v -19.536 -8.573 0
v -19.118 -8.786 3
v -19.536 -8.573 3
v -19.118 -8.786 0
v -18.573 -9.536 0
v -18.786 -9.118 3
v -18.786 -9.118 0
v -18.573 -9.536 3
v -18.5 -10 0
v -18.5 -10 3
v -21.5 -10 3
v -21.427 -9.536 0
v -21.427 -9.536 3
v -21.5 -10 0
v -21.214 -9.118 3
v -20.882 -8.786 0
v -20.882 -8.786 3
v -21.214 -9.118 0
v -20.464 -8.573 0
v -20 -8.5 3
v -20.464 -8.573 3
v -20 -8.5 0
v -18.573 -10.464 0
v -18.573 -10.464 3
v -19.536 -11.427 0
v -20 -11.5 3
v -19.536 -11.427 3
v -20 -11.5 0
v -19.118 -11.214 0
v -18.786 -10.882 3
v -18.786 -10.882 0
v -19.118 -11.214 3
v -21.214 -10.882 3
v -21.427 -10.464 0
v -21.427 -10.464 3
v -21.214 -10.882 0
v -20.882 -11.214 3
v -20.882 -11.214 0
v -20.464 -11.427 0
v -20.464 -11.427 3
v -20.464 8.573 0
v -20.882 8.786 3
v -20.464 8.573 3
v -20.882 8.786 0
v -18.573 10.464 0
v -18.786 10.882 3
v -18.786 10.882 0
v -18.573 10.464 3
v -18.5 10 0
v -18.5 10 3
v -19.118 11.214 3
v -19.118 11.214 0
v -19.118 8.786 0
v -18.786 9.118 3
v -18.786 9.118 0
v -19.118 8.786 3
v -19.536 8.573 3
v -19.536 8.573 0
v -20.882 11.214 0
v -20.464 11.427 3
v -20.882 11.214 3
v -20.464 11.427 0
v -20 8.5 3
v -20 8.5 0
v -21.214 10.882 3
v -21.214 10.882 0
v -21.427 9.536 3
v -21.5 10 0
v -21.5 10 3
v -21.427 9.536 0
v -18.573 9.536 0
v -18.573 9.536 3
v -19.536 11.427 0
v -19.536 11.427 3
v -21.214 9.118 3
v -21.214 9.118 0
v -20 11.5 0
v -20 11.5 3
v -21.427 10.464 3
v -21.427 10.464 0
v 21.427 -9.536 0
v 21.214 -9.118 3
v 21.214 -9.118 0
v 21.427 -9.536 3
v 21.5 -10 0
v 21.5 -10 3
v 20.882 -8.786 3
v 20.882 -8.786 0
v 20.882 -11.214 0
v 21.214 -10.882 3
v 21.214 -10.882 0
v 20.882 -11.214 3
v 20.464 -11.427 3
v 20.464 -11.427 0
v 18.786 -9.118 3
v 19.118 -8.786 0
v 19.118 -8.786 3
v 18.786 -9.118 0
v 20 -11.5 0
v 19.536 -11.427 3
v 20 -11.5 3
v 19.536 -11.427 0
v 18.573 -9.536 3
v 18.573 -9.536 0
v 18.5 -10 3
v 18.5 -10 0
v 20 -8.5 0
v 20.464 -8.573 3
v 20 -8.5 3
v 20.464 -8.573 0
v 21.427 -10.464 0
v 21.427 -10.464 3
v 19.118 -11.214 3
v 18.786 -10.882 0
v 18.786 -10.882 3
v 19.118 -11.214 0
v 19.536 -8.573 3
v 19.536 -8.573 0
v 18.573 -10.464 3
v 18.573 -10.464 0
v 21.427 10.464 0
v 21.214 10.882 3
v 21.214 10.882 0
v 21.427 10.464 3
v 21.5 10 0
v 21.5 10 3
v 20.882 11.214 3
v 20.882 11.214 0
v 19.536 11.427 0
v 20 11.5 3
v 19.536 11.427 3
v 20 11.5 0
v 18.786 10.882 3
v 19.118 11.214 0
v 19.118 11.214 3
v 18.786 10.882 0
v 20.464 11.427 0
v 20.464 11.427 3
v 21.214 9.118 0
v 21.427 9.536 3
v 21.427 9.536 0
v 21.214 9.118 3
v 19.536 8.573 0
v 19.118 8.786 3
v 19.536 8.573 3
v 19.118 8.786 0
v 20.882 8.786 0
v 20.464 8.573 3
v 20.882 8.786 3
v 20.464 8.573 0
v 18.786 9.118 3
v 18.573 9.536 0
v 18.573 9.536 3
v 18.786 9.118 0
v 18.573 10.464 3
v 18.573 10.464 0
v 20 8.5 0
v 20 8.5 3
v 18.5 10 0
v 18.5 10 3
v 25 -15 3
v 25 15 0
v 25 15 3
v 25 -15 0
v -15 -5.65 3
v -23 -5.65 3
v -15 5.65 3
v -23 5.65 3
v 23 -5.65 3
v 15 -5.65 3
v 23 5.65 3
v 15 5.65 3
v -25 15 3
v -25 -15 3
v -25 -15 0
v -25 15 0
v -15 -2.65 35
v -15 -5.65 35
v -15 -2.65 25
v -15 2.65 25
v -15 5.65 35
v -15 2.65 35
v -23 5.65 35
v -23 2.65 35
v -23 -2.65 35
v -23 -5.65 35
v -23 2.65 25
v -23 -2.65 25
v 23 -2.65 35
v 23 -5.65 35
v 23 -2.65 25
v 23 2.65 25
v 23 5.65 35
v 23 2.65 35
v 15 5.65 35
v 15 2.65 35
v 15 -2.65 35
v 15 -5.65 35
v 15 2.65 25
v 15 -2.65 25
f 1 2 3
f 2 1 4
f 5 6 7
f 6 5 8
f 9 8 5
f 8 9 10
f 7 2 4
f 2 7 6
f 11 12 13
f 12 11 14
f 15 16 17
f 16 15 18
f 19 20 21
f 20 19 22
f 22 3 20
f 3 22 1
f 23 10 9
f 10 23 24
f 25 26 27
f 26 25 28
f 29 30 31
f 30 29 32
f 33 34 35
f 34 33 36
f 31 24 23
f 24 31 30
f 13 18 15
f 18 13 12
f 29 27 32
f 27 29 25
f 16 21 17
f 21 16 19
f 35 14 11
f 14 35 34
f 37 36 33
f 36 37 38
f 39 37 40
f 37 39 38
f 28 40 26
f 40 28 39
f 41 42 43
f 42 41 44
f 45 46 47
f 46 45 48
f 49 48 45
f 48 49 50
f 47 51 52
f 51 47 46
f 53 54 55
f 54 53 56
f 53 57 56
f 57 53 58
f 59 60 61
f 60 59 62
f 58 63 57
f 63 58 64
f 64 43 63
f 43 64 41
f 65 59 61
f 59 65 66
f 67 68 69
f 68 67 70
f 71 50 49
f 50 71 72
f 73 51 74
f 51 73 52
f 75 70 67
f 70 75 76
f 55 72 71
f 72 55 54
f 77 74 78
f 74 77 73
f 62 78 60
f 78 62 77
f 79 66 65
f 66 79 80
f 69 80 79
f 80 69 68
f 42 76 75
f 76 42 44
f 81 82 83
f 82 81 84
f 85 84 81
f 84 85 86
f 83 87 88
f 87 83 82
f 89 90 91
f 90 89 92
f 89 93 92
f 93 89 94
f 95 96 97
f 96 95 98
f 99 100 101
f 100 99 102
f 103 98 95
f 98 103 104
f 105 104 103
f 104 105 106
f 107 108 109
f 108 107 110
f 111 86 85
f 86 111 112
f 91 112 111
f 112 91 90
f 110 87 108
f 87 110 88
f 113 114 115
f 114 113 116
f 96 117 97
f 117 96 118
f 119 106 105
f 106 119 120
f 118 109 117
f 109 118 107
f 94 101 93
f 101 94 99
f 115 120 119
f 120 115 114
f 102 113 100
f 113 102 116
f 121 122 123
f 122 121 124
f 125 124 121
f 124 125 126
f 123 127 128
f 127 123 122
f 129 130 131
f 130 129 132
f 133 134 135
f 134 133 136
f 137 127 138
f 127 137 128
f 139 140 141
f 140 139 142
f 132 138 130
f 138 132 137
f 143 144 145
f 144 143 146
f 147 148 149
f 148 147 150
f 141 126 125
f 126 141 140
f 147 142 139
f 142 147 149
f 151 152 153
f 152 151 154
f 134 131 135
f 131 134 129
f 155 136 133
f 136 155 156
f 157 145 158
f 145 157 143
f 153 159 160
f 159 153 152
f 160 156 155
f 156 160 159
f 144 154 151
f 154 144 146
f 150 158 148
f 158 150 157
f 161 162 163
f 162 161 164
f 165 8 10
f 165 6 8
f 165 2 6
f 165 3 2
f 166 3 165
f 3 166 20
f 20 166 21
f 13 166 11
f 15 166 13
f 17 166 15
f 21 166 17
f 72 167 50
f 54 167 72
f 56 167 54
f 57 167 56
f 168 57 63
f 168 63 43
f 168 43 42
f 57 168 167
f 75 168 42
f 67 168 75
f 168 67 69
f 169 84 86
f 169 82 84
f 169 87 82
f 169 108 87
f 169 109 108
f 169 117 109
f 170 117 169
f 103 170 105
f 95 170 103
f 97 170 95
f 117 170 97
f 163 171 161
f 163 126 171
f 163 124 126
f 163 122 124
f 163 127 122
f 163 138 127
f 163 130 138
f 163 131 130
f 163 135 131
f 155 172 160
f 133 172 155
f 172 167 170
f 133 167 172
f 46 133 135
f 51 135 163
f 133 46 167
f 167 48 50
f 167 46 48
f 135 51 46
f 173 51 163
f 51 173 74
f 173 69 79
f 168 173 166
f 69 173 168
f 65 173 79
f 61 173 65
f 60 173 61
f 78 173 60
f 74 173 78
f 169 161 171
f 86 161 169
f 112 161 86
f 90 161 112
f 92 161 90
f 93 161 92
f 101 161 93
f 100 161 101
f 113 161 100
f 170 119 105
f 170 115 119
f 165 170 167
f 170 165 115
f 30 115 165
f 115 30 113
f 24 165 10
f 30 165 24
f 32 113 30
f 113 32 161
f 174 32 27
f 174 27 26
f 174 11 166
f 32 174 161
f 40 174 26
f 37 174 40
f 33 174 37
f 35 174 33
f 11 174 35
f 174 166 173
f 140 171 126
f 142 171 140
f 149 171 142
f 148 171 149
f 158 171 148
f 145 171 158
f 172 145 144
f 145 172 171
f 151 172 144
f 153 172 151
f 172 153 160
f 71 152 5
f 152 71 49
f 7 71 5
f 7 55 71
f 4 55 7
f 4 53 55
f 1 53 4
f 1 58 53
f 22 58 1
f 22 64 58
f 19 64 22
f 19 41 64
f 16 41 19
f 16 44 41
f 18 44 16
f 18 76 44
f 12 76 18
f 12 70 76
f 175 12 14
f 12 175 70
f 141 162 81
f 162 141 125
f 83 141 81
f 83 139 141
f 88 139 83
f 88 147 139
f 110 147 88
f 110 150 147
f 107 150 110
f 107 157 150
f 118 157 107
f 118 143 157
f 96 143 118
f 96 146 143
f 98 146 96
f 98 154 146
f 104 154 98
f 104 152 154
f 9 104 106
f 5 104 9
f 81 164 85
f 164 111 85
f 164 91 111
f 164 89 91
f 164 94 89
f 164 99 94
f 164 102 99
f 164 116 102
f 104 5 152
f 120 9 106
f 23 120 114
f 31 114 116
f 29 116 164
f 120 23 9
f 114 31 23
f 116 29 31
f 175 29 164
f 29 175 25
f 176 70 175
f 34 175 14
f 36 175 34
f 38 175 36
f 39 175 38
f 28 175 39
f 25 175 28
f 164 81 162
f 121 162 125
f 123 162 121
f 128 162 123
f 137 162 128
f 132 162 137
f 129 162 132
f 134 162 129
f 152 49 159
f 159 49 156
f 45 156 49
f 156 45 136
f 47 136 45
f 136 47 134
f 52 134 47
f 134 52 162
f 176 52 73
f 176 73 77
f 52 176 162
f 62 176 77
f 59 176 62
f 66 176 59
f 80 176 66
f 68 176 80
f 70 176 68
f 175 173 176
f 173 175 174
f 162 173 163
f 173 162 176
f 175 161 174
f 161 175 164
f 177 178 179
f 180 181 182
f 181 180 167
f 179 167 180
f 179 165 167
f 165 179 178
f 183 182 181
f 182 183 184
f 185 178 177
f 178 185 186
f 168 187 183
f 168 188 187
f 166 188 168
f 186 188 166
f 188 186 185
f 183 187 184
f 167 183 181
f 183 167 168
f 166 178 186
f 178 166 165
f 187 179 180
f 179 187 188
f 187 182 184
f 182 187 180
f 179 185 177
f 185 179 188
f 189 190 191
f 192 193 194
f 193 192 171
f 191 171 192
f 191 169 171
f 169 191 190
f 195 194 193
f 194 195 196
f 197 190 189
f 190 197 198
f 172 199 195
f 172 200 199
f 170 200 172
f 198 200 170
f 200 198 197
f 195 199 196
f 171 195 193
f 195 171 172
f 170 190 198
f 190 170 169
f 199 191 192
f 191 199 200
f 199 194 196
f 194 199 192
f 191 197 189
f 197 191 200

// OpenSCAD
// file: fan.scad
// Steam Engine Fan - Three Piece Design
// Piece 1: Base with U-cradle bearings (prints flat, no supports)
// Piece 2: Axle with pulley only (prints on side, minimal supports)
// Piece 3: Fan disc with D-hole hub (prints flat, no supports)

// === Parameters ===
fan_blades = 6;
fan_radius = 25;
fan_hub_radius = 6;
fan_blade_width = 8;
fan_blade_thickness = 2;
fan_blade_angle = 25;

pulley_radius = 8;
pulley_width = 6;
pulley_groove_depth = 1.5;

axle_radius = 2.5;
axle_length = 65;
d_flat_depth = 1;  // how much to cut for D-shape

base_length = 50;
base_width = 30;
base_height = 3;
base_screw_hole_radius = 1.5;
base_screw_inset = 5;

bearing_height = 35;
bearing_wall = 3;
bearing_width = 8;
clearance = 0.15;  // tight fit for open slot

// === D-shape profiles ===
module d_shaft(length) {
    // Axle with a flat cut on one side
    difference() {
        rotate([0, 90, 0])
            cylinder(h=length, r=axle_radius, center=true, $fn=20);
        // Cut flat
        translate([0, axle_radius - d_flat_depth + axle_radius, 0])
            cube([length + 1, axle_radius * 2, axle_radius * 2], center=true);
    }
}

module d_hole(depth) {
    // Matching D-shaped hole with clearance
    hole_r = axle_radius + 0.2;
    difference() {
        rotate([0, 90, 0])
            cylinder(h=depth + 1, r=hole_r, center=true, $fn=20);
        translate([0, hole_r - d_flat_depth + hole_r, 0])
            cube([depth + 2, hole_r * 2, hole_r * 2], center=true);
    }
}

// === Piece 1: Base with U-Cradle Bearings ===

module base() {
    difference() {
        cube([base_length, base_width, base_height], center=true);
        for (x = [-base_length/2 + base_screw_inset, base_length/2 - base_screw_inset])
            for (y = [-base_width/2 + base_screw_inset, base_width/2 - base_screw_inset])
                translate([x, y, 0])
                    cylinder(h=base_height+1, r=base_screw_hole_radius, center=true, $fn=20);
    }
}

module cradle_bearing() {
    cradle_r_inner = axle_radius + clearance;
    cradle_r_outer = cradle_r_inner + bearing_wall;
    post_width = bearing_width;
    post_depth = cradle_r_outer * 2;
    slot_width = (axle_radius + clearance) * 2;  // width of slot for axle
    slot_depth = bearing_height - 25;  // slot bottom at 25mm above base floor

    // Simple rectangular post with vertical slot from top
    difference() {
        // Solid post
        translate([-post_width/2, -post_depth/2, base_height/2])
            cube([post_width, post_depth, bearing_height - base_height/2]);
        // Vertical slot cut from top
        translate([-post_width/2 - 0.5, -slot_width/2, bearing_height - slot_depth])
            cube([post_width + 1, slot_width, slot_depth + 1]);
    }
}

module piece1_base() {
    translate([0, 0, base_height/2])
        base();
    pulley_bearing_x = -base_length/2 + bearing_width/2 + 2;
    fan_bearing_x = base_length/2 - bearing_width/2 - 2;
    translate([pulley_bearing_x, 0, 0])
        cradle_bearing();
    translate([fan_bearing_x, 0, 0])
        cradle_bearing();
}

// === Piece 2: Axle + Pulley (no fan) ===

module pulley() {
    rotate([0, 90, 0])
        difference() {
            cylinder(h=pulley_width, r=pulley_radius, center=true, $fn=40);
            rotate_extrude($fn=40)
                translate([pulley_radius - pulley_groove_depth/2, 0, 0])
                    circle(r=pulley_groove_depth, $fn=20);
        }
}

module piece2_axle() {
    // Axle with D-flat on fan end
    difference() {
        rotate([0, 90, 0])
            cylinder(h=axle_length, r=axle_radius, center=true, $fn=20);
        // D-flat cut on fan end (last 10mm)
        translate([axle_length/2 - 5, axle_radius, 0])
            cube([10.1, axle_radius * 2, axle_radius * 2], center=true);
    }
    // Pulley near one end
    translate([-axle_length/2 + pulley_width/2 + 2, 0, 0])
        pulley();
    // Retaining collar next to pulley
    translate([-axle_length/2 + pulley_width + 4, 0, 0])
        rotate([0, 90, 0])
            cylinder(h=2, r=axle_radius + 1.5, center=true, $fn=20);
}

// === Piece 3: Fan Disc ===

blade_sweep = 30;  // degrees of curve across blade length

module swept_blade() {
    blade_length = fan_radius - fan_hub_radius + 1;
    steps = 8;
    step_len = blade_length / steps;
    step_angle = blade_sweep / steps;

    for (s = [0:steps-1]) {
        rotate([0, 0, s * step_angle])
            translate([fan_hub_radius - 1 + s * step_len, -fan_blade_thickness/2, 0])
                cube([step_len + 0.1, fan_blade_thickness, fan_blade_width]);
    }
}

module piece3_fan() {
    difference() {
        union() {
            // Hub
            cylinder(h=fan_blade_width, r=fan_hub_radius, $fn=30);
            // Swept blades
            for (i = [0:fan_blades-1]) {
                rotate([0, 0, i * (360/fan_blades)])
                    swept_blade();
            }
        }
        // D-shaped hole through hub (along Z)
        translate([0, 0, -0.5]) {
            hole_r = axle_radius + 0.2;
            difference() {
                cylinder(h=fan_blade_width + 1, r=hole_r, $fn=20);
                translate([0, hole_r - d_flat_depth + hole_r, 0])
                    cube([hole_r * 2 + 1, hole_r * 2, fan_blade_width + 2], center=true);
            }
        }
    }
}

// === Render all pieces for preview ===
piece1_base();

translate([0, 0, bearing_height + 15])
    piece2_axle();

translate([0, 50, fan_radius + 5])
    piece3_fan();
// main file
// Piece 1: Base with Vertical Slot Bearings
// Prints flat, NO supports needed
// Axle drops into deep vertical slots from above

use <fan.scad>
piece1_base();
